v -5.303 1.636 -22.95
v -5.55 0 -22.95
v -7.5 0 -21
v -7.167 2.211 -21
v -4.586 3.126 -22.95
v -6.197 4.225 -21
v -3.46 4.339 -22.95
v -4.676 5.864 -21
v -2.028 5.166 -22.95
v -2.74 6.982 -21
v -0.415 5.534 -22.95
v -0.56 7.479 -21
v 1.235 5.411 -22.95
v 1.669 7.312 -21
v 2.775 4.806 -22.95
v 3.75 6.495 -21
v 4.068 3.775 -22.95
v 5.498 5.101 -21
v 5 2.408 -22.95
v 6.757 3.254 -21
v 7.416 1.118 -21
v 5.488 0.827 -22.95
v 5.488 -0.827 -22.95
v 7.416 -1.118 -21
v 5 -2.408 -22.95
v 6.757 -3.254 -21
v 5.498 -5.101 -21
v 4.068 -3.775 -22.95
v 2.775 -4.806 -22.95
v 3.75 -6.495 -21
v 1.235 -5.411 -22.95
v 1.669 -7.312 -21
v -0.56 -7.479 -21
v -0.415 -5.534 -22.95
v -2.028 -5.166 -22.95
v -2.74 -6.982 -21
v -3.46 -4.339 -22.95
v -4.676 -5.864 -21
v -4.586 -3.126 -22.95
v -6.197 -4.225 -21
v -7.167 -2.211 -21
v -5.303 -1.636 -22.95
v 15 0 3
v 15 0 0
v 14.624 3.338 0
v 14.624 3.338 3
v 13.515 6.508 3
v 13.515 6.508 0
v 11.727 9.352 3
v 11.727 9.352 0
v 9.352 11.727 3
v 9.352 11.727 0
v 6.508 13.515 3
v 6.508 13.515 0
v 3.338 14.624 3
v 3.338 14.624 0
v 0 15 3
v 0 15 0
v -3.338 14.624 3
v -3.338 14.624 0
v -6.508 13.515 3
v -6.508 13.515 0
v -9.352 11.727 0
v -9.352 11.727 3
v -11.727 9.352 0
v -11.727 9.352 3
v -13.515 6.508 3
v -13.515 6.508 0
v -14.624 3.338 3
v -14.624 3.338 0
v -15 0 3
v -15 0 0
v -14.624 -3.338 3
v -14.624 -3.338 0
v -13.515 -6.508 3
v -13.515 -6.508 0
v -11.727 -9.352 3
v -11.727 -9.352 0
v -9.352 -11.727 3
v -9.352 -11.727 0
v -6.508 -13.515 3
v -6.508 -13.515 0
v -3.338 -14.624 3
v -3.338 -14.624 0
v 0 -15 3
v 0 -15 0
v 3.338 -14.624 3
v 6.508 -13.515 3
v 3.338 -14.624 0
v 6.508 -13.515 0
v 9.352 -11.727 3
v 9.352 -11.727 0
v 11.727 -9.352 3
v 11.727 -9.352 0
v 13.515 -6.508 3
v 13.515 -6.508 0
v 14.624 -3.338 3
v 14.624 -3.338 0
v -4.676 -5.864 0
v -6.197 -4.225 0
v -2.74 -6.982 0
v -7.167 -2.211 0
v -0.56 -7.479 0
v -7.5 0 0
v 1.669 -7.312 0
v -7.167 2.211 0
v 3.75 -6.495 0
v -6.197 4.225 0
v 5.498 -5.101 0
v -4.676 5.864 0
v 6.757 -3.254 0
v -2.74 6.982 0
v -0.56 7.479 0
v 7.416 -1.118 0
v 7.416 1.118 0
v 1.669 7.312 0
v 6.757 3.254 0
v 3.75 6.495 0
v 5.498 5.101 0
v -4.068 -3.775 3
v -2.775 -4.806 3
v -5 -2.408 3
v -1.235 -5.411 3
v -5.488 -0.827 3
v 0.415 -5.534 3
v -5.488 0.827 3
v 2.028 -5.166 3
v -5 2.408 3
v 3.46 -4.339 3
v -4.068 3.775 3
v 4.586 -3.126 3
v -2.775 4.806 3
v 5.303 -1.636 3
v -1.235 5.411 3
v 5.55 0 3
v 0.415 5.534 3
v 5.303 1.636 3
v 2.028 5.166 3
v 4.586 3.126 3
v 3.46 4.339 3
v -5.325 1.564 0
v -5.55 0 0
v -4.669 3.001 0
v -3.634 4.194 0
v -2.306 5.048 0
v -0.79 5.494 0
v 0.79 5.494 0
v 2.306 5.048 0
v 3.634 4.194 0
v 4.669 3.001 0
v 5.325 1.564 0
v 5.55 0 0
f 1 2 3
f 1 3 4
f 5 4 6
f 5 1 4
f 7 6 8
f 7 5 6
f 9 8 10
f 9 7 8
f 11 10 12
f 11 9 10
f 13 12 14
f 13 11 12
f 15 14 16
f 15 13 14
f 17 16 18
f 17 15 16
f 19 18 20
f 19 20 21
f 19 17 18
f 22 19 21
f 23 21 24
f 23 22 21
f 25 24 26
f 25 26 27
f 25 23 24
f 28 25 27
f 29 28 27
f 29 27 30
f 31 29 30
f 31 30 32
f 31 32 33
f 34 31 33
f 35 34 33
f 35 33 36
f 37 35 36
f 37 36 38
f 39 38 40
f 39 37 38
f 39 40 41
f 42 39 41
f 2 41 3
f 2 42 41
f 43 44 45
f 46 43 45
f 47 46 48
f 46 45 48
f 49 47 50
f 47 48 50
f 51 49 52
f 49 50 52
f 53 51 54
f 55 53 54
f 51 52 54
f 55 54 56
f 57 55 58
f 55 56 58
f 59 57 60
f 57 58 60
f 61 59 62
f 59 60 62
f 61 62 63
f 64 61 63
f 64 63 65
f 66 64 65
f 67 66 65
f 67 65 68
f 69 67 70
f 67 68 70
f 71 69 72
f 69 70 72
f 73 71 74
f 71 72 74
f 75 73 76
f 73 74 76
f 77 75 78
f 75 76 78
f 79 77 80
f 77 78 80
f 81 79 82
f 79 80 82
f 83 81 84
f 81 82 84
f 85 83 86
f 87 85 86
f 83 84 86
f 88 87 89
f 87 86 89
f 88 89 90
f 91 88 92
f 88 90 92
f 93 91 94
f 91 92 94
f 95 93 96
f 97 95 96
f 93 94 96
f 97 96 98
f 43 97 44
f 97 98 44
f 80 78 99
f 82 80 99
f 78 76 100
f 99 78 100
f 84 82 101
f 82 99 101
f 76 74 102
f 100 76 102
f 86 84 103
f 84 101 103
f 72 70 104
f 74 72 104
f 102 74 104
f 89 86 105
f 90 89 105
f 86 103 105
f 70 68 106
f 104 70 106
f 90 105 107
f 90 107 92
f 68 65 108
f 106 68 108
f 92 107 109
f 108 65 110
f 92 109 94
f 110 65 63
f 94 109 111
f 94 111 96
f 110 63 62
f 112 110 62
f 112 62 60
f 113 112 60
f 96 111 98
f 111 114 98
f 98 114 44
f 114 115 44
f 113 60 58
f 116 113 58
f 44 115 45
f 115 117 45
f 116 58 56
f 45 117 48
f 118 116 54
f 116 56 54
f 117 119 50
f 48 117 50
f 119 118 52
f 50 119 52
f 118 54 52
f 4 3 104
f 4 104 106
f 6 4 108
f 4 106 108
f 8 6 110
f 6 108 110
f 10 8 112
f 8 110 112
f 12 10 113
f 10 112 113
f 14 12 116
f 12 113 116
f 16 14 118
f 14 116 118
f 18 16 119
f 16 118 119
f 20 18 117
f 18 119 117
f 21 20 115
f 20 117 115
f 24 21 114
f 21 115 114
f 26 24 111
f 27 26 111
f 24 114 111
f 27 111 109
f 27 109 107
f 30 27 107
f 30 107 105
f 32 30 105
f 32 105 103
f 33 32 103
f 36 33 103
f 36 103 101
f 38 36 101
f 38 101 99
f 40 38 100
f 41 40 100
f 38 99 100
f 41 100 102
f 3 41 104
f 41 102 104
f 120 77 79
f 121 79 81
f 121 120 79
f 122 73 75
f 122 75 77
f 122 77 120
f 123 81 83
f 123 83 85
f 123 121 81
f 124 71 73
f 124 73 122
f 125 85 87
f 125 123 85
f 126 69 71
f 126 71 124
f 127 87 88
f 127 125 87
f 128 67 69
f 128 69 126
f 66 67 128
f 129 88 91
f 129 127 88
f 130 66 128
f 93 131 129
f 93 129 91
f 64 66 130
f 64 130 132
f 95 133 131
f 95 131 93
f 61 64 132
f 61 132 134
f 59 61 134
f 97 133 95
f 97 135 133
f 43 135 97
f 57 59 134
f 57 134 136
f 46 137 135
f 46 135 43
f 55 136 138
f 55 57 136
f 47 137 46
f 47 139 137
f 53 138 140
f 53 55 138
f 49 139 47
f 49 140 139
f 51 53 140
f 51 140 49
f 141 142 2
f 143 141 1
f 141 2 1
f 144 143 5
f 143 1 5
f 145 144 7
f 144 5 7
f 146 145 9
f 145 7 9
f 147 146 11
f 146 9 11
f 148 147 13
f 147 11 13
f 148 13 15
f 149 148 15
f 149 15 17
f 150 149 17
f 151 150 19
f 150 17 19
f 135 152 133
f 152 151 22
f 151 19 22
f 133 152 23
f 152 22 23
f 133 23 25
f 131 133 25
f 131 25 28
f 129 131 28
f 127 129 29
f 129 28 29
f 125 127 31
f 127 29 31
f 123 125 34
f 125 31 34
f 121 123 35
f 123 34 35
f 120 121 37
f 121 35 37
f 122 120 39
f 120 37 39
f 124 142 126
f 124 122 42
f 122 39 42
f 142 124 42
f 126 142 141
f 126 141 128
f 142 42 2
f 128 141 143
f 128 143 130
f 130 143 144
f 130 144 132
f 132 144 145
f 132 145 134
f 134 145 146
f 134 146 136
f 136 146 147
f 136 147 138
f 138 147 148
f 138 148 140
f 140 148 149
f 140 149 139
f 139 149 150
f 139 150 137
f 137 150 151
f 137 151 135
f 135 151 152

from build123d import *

# Parameters (mm, degrees)
ESQUISSE1_R             = 15
BOSS_EXTRU_1_DEPTH      = 3
ESQUISSE2_R             = 7.5
BOSS_EXTRU_2_DEPTH      = 23
CHANFREIN1_SIZE         = 2
ESQUISSE3_R             = 5.55
ENL_V_MAT_EXTRU_1_DEPTH = 23
ESQUISSE4_R             = 5.55
ENL_V_MAT_EXTRU_2_DEPTH = 26


with BuildPart() as part:
    # Esquisse1 → Boss.-Extru.1 (new body)
    with BuildSketch(Plane.XY):
        Circle(ESQUISSE1_R)
    extrude(amount=BOSS_EXTRU_1_DEPTH)

    # Esquisse2 → Boss.-Extru.2 (add)
    with BuildSketch(Plane(origin=(0, 0, 0), x_dir=(-1, 0, 0), z_dir=(0, 0, -1))):
        Circle(ESQUISSE2_R)
    extrude(amount=BOSS_EXTRU_2_DEPTH)

    # Chanfrein1
    chanfrein1_edges = [part.edges().sort_by_distance(p)[0] for p in [
        (7.5, 0, -23),
    ]]
    chamfer(chanfrein1_edges, length=CHANFREIN1_SIZE)

    # Esquisse3 → Enlèv. mat.-Extru.1 (cut)
    with BuildSketch(Plane(origin=(0, 0, -23), x_dir=(-1, 0, 0), z_dir=(0, 0, -1))):
        Circle(ESQUISSE3_R)
    extrude(amount=-ENL_V_MAT_EXTRU_1_DEPTH, mode=Mode.SUBTRACT)

    # Esquisse4 → Enlèv. mat.-Extru.2 (cut)
    with BuildSketch(Plane.XY.offset(3)):
        Circle(ESQUISSE4_R)
    extrude(amount=-ENL_V_MAT_EXTRU_2_DEPTH, mode=Mode.SUBTRACT)


solid = part.part
